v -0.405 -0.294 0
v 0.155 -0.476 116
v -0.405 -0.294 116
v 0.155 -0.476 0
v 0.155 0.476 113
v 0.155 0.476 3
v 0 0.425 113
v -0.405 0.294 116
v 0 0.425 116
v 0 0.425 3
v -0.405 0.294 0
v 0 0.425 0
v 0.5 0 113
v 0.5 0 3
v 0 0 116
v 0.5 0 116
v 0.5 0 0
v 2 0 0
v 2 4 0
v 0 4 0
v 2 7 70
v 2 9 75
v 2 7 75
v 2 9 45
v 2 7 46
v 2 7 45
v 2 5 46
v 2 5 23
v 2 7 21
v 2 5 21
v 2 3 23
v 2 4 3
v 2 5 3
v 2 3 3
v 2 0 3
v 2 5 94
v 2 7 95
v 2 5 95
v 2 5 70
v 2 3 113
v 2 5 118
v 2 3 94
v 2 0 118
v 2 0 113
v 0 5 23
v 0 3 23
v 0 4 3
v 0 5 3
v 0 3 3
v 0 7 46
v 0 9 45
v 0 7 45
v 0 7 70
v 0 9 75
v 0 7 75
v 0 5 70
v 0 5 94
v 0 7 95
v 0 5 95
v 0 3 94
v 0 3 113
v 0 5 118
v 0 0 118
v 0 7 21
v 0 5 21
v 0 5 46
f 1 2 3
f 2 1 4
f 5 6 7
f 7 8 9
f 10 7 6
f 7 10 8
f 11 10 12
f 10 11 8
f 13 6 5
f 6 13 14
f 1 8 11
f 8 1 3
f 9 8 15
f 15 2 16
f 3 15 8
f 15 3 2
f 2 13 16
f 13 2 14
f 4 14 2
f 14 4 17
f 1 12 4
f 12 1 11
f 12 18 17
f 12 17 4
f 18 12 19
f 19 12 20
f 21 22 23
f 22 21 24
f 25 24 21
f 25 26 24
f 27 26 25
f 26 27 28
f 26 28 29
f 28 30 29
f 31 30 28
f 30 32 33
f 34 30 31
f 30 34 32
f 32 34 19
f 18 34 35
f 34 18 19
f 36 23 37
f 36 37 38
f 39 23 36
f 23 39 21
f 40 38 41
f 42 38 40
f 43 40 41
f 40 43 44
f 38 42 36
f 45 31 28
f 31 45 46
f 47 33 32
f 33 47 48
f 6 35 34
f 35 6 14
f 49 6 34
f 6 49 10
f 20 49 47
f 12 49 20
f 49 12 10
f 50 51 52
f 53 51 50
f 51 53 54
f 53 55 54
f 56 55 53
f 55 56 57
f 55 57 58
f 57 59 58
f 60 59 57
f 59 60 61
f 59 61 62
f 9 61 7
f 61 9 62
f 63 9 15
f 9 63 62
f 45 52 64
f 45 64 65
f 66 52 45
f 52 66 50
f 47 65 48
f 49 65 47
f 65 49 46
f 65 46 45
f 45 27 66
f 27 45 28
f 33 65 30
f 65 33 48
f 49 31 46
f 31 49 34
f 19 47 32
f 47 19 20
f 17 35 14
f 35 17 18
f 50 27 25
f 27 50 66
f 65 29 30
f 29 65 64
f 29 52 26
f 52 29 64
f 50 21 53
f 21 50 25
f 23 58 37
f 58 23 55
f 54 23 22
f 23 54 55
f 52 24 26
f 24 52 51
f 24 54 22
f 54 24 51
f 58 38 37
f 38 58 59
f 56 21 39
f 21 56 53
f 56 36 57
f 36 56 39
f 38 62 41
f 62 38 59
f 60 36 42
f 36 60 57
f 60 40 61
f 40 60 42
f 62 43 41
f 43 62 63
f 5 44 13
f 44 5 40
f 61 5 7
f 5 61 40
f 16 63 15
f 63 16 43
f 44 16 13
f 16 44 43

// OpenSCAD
cylinder(116,0.5,0.5);
translate([0,3,3])cube([2,2,20]);
cube([2,4,3]);
translate([0,5,21])cube([2,2,25]);
translate([0,7,45])cube([2,2,30]);
translate([0,5,70])cube([2,2,25]);
translate([0,3,94])cube([2,2,20]);
translate([0,0,113])cube([2,5,5]);
